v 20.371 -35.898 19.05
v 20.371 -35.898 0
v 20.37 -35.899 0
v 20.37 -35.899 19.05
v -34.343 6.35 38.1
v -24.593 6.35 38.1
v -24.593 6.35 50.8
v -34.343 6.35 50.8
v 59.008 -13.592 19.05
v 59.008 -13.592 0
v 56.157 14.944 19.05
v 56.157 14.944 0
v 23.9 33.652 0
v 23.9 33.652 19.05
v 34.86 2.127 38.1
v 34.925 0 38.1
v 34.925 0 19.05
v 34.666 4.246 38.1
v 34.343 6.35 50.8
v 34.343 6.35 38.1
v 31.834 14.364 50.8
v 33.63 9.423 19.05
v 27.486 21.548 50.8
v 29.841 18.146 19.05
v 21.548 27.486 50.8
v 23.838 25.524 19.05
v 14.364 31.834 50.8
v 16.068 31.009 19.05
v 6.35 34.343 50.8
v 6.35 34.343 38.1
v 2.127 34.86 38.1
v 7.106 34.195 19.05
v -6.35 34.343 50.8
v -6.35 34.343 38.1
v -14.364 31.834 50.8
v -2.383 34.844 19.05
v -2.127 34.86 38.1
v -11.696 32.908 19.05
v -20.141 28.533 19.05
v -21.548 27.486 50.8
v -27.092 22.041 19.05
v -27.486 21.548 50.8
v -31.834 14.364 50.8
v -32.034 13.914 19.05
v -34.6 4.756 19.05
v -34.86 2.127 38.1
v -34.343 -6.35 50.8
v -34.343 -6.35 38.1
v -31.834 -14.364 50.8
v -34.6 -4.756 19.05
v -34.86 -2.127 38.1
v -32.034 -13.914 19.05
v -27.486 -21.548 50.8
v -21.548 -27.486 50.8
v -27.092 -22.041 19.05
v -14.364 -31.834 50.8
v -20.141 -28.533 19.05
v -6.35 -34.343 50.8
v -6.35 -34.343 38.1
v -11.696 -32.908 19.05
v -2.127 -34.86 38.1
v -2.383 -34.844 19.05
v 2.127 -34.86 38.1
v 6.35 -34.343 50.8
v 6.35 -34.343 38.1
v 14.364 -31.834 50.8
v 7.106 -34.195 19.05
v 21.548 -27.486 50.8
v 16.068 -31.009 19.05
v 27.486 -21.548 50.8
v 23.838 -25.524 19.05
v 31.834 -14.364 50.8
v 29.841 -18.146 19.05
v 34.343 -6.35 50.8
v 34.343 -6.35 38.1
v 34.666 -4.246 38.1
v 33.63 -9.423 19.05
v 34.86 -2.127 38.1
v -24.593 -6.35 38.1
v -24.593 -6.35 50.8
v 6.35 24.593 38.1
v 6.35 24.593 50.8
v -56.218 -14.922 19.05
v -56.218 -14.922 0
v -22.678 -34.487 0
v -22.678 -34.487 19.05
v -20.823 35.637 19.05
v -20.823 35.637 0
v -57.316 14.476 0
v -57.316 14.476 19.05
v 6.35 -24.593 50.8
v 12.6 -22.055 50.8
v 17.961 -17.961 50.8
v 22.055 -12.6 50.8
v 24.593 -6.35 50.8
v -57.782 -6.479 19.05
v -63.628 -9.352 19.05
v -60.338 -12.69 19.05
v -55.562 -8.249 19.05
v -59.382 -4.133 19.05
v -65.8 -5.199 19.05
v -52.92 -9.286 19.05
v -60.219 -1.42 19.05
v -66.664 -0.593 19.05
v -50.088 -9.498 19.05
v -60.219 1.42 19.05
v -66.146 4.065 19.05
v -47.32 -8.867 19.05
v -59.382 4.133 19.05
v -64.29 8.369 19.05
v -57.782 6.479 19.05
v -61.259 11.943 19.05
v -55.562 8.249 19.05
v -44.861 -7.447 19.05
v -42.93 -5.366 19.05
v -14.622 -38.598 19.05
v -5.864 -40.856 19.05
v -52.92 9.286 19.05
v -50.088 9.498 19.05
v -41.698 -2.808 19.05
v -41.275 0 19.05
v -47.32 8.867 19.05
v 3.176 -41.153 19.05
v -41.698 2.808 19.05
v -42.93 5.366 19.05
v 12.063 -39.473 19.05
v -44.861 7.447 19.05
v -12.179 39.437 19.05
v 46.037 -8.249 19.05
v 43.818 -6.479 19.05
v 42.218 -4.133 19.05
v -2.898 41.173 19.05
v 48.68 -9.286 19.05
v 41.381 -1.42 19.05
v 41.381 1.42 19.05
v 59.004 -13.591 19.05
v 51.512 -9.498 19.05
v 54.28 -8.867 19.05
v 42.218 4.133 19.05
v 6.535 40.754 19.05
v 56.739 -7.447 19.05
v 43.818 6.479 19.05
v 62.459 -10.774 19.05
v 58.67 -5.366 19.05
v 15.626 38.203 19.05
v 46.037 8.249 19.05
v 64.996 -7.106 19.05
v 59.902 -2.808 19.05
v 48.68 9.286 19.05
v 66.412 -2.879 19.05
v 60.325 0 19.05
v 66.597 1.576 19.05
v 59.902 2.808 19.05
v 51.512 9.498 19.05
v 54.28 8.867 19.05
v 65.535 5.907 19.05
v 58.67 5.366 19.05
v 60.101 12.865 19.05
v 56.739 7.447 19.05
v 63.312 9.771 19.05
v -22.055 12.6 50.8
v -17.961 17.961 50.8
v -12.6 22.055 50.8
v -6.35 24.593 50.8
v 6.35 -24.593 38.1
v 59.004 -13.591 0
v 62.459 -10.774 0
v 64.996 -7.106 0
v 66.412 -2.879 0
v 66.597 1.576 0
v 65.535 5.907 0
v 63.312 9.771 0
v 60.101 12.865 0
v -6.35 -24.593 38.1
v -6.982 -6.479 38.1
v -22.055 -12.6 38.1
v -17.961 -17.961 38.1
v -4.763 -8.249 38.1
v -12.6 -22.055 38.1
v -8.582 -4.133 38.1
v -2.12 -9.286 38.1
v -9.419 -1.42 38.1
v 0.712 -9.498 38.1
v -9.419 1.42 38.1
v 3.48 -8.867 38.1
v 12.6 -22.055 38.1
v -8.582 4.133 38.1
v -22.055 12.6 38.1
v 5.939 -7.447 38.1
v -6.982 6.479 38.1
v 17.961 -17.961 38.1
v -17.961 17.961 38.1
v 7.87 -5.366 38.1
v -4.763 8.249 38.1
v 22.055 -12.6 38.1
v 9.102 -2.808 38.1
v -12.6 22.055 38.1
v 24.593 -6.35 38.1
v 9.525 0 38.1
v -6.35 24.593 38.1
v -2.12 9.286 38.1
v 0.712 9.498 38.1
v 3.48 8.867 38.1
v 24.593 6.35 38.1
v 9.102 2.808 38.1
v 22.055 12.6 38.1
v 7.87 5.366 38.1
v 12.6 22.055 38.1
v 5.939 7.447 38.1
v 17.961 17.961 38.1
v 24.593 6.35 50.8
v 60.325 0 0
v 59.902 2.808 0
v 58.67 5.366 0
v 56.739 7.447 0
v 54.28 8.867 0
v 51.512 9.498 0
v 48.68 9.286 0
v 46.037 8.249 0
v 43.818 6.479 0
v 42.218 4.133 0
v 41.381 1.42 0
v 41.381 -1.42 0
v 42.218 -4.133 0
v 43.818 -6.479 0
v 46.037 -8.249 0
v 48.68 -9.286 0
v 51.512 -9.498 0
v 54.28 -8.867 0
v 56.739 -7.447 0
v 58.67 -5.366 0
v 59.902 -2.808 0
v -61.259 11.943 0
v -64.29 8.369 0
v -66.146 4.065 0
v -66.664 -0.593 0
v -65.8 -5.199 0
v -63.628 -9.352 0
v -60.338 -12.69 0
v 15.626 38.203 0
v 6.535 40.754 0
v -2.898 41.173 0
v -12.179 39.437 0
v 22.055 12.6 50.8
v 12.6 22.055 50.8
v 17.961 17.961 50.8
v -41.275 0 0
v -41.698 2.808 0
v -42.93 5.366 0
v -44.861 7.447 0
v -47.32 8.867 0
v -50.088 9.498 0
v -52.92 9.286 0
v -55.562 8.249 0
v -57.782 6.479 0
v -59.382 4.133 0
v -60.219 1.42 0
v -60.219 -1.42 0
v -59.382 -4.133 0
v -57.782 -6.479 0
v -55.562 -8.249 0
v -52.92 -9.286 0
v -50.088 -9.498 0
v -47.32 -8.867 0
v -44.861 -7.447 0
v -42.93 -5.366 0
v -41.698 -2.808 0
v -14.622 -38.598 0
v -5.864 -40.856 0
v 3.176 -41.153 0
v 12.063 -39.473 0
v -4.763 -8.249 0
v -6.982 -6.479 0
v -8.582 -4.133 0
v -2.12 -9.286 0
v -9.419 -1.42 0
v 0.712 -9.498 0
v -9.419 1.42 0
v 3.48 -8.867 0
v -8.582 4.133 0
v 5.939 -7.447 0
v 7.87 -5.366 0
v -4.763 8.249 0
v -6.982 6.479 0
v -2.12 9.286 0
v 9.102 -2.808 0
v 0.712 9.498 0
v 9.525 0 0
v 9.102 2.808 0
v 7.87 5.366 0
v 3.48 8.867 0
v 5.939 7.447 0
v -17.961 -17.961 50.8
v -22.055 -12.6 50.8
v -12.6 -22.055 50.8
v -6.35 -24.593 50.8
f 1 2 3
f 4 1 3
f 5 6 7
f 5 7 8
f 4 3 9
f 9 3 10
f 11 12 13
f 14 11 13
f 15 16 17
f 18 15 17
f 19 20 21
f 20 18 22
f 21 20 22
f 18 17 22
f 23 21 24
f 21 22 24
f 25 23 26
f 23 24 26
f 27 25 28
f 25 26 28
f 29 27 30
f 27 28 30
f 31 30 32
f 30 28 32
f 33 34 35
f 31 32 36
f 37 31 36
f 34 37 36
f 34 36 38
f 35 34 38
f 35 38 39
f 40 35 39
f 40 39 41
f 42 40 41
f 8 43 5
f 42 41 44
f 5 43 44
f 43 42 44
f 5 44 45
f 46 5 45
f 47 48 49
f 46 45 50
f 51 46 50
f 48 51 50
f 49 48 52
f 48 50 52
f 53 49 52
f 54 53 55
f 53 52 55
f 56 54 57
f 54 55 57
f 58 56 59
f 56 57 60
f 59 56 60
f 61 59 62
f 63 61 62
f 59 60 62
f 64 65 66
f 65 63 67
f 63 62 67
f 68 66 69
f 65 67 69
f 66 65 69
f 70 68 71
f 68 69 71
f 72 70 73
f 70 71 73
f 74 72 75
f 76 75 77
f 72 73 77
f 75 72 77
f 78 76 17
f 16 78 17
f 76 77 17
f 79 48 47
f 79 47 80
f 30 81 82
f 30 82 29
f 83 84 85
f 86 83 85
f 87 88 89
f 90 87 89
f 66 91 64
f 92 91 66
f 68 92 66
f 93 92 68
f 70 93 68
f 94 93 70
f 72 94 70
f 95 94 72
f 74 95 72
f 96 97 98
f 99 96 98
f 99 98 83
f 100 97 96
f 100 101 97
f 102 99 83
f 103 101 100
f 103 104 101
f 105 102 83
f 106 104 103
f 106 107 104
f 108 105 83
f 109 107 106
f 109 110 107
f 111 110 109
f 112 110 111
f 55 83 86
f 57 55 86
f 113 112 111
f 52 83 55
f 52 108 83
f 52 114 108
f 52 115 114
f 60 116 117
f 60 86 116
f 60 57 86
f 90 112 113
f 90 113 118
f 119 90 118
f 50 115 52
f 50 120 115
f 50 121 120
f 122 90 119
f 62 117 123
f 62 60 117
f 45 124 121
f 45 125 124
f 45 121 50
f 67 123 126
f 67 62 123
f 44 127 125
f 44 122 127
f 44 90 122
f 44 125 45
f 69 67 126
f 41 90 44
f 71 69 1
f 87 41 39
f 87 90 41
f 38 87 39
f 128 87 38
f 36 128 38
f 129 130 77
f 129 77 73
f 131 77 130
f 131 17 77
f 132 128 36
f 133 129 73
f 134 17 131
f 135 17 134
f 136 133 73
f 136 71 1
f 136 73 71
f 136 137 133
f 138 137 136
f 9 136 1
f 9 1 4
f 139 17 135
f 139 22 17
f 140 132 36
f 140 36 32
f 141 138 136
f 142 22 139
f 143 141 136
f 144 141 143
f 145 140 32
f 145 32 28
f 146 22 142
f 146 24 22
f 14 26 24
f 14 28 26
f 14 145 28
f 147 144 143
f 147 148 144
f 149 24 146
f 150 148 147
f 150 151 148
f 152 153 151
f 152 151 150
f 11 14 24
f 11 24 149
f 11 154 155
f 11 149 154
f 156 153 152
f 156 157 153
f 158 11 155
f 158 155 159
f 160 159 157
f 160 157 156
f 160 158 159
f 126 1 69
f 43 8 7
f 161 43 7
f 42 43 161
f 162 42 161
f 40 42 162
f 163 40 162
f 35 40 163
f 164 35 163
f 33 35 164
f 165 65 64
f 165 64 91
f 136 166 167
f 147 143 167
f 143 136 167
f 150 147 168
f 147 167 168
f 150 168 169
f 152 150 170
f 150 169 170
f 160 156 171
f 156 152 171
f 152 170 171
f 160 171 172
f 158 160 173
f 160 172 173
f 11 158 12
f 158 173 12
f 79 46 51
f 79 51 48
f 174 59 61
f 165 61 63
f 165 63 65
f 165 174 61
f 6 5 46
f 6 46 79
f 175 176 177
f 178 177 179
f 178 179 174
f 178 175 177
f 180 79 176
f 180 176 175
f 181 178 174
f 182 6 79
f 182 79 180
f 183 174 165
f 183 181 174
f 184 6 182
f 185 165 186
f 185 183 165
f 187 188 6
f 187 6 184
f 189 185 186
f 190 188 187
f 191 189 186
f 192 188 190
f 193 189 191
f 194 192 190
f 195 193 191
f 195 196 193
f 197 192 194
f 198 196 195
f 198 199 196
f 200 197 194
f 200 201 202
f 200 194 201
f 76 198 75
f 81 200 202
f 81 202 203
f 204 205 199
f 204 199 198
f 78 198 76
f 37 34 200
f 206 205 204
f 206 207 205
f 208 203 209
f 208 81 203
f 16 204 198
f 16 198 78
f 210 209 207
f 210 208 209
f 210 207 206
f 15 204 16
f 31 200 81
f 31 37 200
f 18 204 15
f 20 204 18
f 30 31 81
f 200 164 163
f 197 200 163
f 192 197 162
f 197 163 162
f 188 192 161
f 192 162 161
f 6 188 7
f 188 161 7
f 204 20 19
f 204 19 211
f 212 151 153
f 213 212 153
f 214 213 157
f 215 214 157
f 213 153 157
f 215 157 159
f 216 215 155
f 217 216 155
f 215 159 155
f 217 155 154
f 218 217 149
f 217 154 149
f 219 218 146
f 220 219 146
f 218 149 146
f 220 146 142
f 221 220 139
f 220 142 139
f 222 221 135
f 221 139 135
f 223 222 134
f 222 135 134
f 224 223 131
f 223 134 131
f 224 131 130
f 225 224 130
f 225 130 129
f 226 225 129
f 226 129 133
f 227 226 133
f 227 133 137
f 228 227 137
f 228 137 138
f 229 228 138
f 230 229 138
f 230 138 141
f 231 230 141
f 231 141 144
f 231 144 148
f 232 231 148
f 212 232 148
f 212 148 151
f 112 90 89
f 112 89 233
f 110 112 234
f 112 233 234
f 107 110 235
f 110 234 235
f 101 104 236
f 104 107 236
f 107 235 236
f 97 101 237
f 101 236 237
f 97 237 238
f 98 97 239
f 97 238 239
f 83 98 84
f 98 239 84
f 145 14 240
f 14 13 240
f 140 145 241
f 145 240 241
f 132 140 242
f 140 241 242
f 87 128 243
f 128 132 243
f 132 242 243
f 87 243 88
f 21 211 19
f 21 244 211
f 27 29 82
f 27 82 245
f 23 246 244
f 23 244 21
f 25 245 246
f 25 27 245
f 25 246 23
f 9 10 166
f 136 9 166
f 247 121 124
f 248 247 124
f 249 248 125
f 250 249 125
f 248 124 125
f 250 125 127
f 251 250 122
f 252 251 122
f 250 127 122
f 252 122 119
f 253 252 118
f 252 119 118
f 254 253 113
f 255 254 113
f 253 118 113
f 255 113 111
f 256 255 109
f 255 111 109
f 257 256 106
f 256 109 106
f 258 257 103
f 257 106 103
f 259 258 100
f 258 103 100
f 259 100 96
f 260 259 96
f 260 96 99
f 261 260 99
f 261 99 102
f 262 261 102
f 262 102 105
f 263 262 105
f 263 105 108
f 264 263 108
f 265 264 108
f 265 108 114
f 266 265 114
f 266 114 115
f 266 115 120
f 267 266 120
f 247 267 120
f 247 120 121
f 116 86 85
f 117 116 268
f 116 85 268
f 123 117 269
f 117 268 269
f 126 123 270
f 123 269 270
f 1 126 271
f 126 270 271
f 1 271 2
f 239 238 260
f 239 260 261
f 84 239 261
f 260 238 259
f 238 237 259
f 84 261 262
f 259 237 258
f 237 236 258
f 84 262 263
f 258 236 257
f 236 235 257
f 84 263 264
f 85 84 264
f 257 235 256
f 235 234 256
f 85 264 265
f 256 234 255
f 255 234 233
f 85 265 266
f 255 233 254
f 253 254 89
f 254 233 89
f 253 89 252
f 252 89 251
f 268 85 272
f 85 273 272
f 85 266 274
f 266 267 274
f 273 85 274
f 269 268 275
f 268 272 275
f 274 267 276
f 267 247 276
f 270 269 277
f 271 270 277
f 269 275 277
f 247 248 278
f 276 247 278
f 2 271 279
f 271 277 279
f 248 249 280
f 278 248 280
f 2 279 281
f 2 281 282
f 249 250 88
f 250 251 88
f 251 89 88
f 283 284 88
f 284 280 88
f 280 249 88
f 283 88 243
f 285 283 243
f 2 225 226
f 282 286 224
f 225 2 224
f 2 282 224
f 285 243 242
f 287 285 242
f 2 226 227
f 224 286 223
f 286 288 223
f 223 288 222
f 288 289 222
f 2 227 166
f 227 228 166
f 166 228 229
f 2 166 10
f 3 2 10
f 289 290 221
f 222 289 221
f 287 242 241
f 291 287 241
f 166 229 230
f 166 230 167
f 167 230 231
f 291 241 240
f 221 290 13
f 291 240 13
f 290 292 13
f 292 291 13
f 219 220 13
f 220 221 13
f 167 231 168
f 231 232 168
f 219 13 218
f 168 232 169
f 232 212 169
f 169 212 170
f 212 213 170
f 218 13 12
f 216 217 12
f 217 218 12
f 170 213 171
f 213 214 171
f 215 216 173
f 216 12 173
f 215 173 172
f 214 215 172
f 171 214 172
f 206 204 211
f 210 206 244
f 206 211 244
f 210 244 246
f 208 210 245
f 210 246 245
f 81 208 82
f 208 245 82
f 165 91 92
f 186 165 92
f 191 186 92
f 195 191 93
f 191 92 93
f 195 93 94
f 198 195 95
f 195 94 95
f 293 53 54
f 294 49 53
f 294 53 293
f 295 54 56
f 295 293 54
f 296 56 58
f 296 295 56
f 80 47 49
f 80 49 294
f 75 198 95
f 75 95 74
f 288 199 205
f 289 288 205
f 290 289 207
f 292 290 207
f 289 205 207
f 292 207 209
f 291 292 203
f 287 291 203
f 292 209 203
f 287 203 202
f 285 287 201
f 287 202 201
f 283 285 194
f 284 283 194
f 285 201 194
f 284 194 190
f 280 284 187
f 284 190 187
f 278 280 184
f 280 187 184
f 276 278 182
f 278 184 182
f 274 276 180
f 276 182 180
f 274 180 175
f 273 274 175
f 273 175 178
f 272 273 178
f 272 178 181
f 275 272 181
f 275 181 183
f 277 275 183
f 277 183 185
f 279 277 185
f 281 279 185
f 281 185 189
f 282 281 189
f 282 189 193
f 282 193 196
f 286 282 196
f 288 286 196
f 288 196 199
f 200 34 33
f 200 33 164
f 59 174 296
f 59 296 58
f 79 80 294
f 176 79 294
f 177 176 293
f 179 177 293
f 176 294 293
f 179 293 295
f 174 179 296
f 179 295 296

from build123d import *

# Parameters (mm, degrees)
F6_DEPTH  = 19.05
F1_R      = 15.875
F0_R      = 41.275
F8_R      = 34.925
F9_DEPTH  = 31.75
F10_R     = 25.4
F11_DEPTH = 12.7
F12_R     = 9.525
F13_DEPTH = 50.8
F15_DEPTH = 12.7
F16_R     = 9.525
F17_DEPTH = 25.4


with BuildPart() as f6:
    # F2 (on Top) → F6 (new body)
    with BuildSketch(Plane.XY):
        Polygon((-20.5864672744, 35.7746137668), (-60.1274476785, 12.8457909373), (-27.6046618819, 7.8555336222), align=None)
    extrude(amount=F6_DEPTH)


with BuildPart() as f6b:
    # F1 (on Top) → F6, piece 2 (new body)
    with BuildSketch(Plane.XY):
        with Locations((-50.8, 0)):
            Circle(F1_R)
    extrude(amount=F6_DEPTH)


with BuildPart() as f6c:
    # F1 (on Top) → F6, piece 3 (new body)
    with BuildSketch(Plane.XY):
        with Locations((50.8, 0)):
            Circle(F1_R)
    extrude(amount=F6_DEPTH)


with BuildPart() as f6d:
    # F0 (on Top) → F6, piece 4 (new body)
    with BuildSketch(Plane.XY):
        Circle(F0_R)
    extrude(amount=F6_DEPTH)


with BuildPart() as f6e:
    # F3 (on Top) → F6, piece 5 (new body)
    with BuildSketch(Plane.XY):
        Polygon((-30.2489809692, -6.1483276077), (-60.227651149, -12.5827733427), (-21.6209739447, -35.1033322513), align=None)
    extrude(amount=F6_DEPTH)


with BuildPart() as f6f:
    # F4 (on Top) → F6, piece 6 (new body)
    with BuildSketch(Plane.XY):
        Polygon((58.4153184481, 13.6340273871), (17.3395914771, 37.4561636104), (25.2016615123, 3.7444084883), align=None)
    extrude(amount=F6_DEPTH)


with BuildPart() as f6g:
    # F5 (on Top) → F6, piece 7 (new body)
    with BuildSketch(Plane.XY):
        Polygon((28.4536294639, -4.6330923215), (20.3704475493, -35.8993813455), (59.0077042557, -13.5921507853), align=None)
    extrude(amount=F6_DEPTH)


with BuildPart() as f6_1:
    add(f6.part)

    # F7: union F6d, F6e, F6g, F6f, F6c, F6b
    add(f6d.part)
    add(f6e.part)
    add(f6g.part)
    add(f6f.part)
    add(f6c.part)
    add(f6b.part)

    # F8 (on face) → F9 (join)
    with BuildSketch(Plane.XY.offset(19.05)):
        Circle(F8_R)
    extrude(amount=F9_DEPTH)

    # F10 (on face) → F11 (cut)
    with BuildSketch(Plane.XY.offset(50.8)):
        Circle(F10_R)
    extrude(amount=-F11_DEPTH, mode=Mode.SUBTRACT)

    # F12 (on face) → F13 (cut)
    with BuildSketch(Plane.XY.offset(38.1)):
        Circle(F12_R)
    extrude(amount=-F13_DEPTH, mode=Mode.SUBTRACT)

    # F14 (on face) → F15 (cut)
    with BuildSketch(Plane.XY.offset(50.8)):
        with BuildLine():
            Line((-34.3428758988, -6.35), (-24.5934442484, -6.35))
            ThreePointArc((-24.5934442484, -6.35), (-25.4, 0), (-24.5934442484, 6.35))
            Line((-24.5934442484, 6.35), (-34.3428758988, 6.35))
            ThreePointArc((-34.3428758988, 6.35), (-34.925, 0), (-34.3428758988, -6.35))
        make_face()
        with BuildLine():
            Line((-6.35, 34.3428758988), (-6.35, 24.5934442484))
            ThreePointArc((-6.35, 24.5934442484), (0, 25.4), (6.35, 24.5934442484))
            Line((6.35, 24.5934442484), (6.35, 34.3428758988))
            ThreePointArc((6.35, 34.3428758988), (0, 34.925), (-6.35, 34.3428758988))
        make_face()
        with BuildLine():
            ThreePointArc((25.4, 0), (25.1975542852, -3.2005090291), (24.5934442484, -6.35))
            Line((24.5934442484, -6.35), (34.3428758988, -6.35))
            ThreePointArc((34.3428758988, -6.35), (34.7791644937, -3.1883133656), (34.925, 0))
            ThreePointArc((34.925, 0), (34.7791644937, 3.1883133656), (34.3428758988, 6.35))
            Line((34.3428758988, 6.35), (24.5934442484, 6.35))
            ThreePointArc((24.5934442484, 6.35), (25.1975542852, 3.2005090291), (25.4, 0))
        make_face()
        with BuildLine():
            ThreePointArc((6.35, -24.5934442484), (0, -25.4), (-6.35, -24.5934442484))
            Line((-6.35, -24.5934442484), (-6.35, -34.3428758988))
            ThreePointArc((-6.35, -34.3428758988), (0, -34.925), (6.35, -34.3428758988))
            Line((6.35, -34.3428758988), (6.35, -24.5934442484))
        make_face()
    extrude(amount=-F15_DEPTH, mode=Mode.SUBTRACT)

    # F16 (on face) → F17 (cut)
    with BuildSketch(Plane.XY.offset(19.05)):
        with Locations((-50.8, 0)):
            Circle(F16_R)
        with Locations((50.8, 0)):
            Circle(F16_R)
    extrude(amount=-F17_DEPTH, mode=Mode.SUBTRACT)


solid = f6_1.part
